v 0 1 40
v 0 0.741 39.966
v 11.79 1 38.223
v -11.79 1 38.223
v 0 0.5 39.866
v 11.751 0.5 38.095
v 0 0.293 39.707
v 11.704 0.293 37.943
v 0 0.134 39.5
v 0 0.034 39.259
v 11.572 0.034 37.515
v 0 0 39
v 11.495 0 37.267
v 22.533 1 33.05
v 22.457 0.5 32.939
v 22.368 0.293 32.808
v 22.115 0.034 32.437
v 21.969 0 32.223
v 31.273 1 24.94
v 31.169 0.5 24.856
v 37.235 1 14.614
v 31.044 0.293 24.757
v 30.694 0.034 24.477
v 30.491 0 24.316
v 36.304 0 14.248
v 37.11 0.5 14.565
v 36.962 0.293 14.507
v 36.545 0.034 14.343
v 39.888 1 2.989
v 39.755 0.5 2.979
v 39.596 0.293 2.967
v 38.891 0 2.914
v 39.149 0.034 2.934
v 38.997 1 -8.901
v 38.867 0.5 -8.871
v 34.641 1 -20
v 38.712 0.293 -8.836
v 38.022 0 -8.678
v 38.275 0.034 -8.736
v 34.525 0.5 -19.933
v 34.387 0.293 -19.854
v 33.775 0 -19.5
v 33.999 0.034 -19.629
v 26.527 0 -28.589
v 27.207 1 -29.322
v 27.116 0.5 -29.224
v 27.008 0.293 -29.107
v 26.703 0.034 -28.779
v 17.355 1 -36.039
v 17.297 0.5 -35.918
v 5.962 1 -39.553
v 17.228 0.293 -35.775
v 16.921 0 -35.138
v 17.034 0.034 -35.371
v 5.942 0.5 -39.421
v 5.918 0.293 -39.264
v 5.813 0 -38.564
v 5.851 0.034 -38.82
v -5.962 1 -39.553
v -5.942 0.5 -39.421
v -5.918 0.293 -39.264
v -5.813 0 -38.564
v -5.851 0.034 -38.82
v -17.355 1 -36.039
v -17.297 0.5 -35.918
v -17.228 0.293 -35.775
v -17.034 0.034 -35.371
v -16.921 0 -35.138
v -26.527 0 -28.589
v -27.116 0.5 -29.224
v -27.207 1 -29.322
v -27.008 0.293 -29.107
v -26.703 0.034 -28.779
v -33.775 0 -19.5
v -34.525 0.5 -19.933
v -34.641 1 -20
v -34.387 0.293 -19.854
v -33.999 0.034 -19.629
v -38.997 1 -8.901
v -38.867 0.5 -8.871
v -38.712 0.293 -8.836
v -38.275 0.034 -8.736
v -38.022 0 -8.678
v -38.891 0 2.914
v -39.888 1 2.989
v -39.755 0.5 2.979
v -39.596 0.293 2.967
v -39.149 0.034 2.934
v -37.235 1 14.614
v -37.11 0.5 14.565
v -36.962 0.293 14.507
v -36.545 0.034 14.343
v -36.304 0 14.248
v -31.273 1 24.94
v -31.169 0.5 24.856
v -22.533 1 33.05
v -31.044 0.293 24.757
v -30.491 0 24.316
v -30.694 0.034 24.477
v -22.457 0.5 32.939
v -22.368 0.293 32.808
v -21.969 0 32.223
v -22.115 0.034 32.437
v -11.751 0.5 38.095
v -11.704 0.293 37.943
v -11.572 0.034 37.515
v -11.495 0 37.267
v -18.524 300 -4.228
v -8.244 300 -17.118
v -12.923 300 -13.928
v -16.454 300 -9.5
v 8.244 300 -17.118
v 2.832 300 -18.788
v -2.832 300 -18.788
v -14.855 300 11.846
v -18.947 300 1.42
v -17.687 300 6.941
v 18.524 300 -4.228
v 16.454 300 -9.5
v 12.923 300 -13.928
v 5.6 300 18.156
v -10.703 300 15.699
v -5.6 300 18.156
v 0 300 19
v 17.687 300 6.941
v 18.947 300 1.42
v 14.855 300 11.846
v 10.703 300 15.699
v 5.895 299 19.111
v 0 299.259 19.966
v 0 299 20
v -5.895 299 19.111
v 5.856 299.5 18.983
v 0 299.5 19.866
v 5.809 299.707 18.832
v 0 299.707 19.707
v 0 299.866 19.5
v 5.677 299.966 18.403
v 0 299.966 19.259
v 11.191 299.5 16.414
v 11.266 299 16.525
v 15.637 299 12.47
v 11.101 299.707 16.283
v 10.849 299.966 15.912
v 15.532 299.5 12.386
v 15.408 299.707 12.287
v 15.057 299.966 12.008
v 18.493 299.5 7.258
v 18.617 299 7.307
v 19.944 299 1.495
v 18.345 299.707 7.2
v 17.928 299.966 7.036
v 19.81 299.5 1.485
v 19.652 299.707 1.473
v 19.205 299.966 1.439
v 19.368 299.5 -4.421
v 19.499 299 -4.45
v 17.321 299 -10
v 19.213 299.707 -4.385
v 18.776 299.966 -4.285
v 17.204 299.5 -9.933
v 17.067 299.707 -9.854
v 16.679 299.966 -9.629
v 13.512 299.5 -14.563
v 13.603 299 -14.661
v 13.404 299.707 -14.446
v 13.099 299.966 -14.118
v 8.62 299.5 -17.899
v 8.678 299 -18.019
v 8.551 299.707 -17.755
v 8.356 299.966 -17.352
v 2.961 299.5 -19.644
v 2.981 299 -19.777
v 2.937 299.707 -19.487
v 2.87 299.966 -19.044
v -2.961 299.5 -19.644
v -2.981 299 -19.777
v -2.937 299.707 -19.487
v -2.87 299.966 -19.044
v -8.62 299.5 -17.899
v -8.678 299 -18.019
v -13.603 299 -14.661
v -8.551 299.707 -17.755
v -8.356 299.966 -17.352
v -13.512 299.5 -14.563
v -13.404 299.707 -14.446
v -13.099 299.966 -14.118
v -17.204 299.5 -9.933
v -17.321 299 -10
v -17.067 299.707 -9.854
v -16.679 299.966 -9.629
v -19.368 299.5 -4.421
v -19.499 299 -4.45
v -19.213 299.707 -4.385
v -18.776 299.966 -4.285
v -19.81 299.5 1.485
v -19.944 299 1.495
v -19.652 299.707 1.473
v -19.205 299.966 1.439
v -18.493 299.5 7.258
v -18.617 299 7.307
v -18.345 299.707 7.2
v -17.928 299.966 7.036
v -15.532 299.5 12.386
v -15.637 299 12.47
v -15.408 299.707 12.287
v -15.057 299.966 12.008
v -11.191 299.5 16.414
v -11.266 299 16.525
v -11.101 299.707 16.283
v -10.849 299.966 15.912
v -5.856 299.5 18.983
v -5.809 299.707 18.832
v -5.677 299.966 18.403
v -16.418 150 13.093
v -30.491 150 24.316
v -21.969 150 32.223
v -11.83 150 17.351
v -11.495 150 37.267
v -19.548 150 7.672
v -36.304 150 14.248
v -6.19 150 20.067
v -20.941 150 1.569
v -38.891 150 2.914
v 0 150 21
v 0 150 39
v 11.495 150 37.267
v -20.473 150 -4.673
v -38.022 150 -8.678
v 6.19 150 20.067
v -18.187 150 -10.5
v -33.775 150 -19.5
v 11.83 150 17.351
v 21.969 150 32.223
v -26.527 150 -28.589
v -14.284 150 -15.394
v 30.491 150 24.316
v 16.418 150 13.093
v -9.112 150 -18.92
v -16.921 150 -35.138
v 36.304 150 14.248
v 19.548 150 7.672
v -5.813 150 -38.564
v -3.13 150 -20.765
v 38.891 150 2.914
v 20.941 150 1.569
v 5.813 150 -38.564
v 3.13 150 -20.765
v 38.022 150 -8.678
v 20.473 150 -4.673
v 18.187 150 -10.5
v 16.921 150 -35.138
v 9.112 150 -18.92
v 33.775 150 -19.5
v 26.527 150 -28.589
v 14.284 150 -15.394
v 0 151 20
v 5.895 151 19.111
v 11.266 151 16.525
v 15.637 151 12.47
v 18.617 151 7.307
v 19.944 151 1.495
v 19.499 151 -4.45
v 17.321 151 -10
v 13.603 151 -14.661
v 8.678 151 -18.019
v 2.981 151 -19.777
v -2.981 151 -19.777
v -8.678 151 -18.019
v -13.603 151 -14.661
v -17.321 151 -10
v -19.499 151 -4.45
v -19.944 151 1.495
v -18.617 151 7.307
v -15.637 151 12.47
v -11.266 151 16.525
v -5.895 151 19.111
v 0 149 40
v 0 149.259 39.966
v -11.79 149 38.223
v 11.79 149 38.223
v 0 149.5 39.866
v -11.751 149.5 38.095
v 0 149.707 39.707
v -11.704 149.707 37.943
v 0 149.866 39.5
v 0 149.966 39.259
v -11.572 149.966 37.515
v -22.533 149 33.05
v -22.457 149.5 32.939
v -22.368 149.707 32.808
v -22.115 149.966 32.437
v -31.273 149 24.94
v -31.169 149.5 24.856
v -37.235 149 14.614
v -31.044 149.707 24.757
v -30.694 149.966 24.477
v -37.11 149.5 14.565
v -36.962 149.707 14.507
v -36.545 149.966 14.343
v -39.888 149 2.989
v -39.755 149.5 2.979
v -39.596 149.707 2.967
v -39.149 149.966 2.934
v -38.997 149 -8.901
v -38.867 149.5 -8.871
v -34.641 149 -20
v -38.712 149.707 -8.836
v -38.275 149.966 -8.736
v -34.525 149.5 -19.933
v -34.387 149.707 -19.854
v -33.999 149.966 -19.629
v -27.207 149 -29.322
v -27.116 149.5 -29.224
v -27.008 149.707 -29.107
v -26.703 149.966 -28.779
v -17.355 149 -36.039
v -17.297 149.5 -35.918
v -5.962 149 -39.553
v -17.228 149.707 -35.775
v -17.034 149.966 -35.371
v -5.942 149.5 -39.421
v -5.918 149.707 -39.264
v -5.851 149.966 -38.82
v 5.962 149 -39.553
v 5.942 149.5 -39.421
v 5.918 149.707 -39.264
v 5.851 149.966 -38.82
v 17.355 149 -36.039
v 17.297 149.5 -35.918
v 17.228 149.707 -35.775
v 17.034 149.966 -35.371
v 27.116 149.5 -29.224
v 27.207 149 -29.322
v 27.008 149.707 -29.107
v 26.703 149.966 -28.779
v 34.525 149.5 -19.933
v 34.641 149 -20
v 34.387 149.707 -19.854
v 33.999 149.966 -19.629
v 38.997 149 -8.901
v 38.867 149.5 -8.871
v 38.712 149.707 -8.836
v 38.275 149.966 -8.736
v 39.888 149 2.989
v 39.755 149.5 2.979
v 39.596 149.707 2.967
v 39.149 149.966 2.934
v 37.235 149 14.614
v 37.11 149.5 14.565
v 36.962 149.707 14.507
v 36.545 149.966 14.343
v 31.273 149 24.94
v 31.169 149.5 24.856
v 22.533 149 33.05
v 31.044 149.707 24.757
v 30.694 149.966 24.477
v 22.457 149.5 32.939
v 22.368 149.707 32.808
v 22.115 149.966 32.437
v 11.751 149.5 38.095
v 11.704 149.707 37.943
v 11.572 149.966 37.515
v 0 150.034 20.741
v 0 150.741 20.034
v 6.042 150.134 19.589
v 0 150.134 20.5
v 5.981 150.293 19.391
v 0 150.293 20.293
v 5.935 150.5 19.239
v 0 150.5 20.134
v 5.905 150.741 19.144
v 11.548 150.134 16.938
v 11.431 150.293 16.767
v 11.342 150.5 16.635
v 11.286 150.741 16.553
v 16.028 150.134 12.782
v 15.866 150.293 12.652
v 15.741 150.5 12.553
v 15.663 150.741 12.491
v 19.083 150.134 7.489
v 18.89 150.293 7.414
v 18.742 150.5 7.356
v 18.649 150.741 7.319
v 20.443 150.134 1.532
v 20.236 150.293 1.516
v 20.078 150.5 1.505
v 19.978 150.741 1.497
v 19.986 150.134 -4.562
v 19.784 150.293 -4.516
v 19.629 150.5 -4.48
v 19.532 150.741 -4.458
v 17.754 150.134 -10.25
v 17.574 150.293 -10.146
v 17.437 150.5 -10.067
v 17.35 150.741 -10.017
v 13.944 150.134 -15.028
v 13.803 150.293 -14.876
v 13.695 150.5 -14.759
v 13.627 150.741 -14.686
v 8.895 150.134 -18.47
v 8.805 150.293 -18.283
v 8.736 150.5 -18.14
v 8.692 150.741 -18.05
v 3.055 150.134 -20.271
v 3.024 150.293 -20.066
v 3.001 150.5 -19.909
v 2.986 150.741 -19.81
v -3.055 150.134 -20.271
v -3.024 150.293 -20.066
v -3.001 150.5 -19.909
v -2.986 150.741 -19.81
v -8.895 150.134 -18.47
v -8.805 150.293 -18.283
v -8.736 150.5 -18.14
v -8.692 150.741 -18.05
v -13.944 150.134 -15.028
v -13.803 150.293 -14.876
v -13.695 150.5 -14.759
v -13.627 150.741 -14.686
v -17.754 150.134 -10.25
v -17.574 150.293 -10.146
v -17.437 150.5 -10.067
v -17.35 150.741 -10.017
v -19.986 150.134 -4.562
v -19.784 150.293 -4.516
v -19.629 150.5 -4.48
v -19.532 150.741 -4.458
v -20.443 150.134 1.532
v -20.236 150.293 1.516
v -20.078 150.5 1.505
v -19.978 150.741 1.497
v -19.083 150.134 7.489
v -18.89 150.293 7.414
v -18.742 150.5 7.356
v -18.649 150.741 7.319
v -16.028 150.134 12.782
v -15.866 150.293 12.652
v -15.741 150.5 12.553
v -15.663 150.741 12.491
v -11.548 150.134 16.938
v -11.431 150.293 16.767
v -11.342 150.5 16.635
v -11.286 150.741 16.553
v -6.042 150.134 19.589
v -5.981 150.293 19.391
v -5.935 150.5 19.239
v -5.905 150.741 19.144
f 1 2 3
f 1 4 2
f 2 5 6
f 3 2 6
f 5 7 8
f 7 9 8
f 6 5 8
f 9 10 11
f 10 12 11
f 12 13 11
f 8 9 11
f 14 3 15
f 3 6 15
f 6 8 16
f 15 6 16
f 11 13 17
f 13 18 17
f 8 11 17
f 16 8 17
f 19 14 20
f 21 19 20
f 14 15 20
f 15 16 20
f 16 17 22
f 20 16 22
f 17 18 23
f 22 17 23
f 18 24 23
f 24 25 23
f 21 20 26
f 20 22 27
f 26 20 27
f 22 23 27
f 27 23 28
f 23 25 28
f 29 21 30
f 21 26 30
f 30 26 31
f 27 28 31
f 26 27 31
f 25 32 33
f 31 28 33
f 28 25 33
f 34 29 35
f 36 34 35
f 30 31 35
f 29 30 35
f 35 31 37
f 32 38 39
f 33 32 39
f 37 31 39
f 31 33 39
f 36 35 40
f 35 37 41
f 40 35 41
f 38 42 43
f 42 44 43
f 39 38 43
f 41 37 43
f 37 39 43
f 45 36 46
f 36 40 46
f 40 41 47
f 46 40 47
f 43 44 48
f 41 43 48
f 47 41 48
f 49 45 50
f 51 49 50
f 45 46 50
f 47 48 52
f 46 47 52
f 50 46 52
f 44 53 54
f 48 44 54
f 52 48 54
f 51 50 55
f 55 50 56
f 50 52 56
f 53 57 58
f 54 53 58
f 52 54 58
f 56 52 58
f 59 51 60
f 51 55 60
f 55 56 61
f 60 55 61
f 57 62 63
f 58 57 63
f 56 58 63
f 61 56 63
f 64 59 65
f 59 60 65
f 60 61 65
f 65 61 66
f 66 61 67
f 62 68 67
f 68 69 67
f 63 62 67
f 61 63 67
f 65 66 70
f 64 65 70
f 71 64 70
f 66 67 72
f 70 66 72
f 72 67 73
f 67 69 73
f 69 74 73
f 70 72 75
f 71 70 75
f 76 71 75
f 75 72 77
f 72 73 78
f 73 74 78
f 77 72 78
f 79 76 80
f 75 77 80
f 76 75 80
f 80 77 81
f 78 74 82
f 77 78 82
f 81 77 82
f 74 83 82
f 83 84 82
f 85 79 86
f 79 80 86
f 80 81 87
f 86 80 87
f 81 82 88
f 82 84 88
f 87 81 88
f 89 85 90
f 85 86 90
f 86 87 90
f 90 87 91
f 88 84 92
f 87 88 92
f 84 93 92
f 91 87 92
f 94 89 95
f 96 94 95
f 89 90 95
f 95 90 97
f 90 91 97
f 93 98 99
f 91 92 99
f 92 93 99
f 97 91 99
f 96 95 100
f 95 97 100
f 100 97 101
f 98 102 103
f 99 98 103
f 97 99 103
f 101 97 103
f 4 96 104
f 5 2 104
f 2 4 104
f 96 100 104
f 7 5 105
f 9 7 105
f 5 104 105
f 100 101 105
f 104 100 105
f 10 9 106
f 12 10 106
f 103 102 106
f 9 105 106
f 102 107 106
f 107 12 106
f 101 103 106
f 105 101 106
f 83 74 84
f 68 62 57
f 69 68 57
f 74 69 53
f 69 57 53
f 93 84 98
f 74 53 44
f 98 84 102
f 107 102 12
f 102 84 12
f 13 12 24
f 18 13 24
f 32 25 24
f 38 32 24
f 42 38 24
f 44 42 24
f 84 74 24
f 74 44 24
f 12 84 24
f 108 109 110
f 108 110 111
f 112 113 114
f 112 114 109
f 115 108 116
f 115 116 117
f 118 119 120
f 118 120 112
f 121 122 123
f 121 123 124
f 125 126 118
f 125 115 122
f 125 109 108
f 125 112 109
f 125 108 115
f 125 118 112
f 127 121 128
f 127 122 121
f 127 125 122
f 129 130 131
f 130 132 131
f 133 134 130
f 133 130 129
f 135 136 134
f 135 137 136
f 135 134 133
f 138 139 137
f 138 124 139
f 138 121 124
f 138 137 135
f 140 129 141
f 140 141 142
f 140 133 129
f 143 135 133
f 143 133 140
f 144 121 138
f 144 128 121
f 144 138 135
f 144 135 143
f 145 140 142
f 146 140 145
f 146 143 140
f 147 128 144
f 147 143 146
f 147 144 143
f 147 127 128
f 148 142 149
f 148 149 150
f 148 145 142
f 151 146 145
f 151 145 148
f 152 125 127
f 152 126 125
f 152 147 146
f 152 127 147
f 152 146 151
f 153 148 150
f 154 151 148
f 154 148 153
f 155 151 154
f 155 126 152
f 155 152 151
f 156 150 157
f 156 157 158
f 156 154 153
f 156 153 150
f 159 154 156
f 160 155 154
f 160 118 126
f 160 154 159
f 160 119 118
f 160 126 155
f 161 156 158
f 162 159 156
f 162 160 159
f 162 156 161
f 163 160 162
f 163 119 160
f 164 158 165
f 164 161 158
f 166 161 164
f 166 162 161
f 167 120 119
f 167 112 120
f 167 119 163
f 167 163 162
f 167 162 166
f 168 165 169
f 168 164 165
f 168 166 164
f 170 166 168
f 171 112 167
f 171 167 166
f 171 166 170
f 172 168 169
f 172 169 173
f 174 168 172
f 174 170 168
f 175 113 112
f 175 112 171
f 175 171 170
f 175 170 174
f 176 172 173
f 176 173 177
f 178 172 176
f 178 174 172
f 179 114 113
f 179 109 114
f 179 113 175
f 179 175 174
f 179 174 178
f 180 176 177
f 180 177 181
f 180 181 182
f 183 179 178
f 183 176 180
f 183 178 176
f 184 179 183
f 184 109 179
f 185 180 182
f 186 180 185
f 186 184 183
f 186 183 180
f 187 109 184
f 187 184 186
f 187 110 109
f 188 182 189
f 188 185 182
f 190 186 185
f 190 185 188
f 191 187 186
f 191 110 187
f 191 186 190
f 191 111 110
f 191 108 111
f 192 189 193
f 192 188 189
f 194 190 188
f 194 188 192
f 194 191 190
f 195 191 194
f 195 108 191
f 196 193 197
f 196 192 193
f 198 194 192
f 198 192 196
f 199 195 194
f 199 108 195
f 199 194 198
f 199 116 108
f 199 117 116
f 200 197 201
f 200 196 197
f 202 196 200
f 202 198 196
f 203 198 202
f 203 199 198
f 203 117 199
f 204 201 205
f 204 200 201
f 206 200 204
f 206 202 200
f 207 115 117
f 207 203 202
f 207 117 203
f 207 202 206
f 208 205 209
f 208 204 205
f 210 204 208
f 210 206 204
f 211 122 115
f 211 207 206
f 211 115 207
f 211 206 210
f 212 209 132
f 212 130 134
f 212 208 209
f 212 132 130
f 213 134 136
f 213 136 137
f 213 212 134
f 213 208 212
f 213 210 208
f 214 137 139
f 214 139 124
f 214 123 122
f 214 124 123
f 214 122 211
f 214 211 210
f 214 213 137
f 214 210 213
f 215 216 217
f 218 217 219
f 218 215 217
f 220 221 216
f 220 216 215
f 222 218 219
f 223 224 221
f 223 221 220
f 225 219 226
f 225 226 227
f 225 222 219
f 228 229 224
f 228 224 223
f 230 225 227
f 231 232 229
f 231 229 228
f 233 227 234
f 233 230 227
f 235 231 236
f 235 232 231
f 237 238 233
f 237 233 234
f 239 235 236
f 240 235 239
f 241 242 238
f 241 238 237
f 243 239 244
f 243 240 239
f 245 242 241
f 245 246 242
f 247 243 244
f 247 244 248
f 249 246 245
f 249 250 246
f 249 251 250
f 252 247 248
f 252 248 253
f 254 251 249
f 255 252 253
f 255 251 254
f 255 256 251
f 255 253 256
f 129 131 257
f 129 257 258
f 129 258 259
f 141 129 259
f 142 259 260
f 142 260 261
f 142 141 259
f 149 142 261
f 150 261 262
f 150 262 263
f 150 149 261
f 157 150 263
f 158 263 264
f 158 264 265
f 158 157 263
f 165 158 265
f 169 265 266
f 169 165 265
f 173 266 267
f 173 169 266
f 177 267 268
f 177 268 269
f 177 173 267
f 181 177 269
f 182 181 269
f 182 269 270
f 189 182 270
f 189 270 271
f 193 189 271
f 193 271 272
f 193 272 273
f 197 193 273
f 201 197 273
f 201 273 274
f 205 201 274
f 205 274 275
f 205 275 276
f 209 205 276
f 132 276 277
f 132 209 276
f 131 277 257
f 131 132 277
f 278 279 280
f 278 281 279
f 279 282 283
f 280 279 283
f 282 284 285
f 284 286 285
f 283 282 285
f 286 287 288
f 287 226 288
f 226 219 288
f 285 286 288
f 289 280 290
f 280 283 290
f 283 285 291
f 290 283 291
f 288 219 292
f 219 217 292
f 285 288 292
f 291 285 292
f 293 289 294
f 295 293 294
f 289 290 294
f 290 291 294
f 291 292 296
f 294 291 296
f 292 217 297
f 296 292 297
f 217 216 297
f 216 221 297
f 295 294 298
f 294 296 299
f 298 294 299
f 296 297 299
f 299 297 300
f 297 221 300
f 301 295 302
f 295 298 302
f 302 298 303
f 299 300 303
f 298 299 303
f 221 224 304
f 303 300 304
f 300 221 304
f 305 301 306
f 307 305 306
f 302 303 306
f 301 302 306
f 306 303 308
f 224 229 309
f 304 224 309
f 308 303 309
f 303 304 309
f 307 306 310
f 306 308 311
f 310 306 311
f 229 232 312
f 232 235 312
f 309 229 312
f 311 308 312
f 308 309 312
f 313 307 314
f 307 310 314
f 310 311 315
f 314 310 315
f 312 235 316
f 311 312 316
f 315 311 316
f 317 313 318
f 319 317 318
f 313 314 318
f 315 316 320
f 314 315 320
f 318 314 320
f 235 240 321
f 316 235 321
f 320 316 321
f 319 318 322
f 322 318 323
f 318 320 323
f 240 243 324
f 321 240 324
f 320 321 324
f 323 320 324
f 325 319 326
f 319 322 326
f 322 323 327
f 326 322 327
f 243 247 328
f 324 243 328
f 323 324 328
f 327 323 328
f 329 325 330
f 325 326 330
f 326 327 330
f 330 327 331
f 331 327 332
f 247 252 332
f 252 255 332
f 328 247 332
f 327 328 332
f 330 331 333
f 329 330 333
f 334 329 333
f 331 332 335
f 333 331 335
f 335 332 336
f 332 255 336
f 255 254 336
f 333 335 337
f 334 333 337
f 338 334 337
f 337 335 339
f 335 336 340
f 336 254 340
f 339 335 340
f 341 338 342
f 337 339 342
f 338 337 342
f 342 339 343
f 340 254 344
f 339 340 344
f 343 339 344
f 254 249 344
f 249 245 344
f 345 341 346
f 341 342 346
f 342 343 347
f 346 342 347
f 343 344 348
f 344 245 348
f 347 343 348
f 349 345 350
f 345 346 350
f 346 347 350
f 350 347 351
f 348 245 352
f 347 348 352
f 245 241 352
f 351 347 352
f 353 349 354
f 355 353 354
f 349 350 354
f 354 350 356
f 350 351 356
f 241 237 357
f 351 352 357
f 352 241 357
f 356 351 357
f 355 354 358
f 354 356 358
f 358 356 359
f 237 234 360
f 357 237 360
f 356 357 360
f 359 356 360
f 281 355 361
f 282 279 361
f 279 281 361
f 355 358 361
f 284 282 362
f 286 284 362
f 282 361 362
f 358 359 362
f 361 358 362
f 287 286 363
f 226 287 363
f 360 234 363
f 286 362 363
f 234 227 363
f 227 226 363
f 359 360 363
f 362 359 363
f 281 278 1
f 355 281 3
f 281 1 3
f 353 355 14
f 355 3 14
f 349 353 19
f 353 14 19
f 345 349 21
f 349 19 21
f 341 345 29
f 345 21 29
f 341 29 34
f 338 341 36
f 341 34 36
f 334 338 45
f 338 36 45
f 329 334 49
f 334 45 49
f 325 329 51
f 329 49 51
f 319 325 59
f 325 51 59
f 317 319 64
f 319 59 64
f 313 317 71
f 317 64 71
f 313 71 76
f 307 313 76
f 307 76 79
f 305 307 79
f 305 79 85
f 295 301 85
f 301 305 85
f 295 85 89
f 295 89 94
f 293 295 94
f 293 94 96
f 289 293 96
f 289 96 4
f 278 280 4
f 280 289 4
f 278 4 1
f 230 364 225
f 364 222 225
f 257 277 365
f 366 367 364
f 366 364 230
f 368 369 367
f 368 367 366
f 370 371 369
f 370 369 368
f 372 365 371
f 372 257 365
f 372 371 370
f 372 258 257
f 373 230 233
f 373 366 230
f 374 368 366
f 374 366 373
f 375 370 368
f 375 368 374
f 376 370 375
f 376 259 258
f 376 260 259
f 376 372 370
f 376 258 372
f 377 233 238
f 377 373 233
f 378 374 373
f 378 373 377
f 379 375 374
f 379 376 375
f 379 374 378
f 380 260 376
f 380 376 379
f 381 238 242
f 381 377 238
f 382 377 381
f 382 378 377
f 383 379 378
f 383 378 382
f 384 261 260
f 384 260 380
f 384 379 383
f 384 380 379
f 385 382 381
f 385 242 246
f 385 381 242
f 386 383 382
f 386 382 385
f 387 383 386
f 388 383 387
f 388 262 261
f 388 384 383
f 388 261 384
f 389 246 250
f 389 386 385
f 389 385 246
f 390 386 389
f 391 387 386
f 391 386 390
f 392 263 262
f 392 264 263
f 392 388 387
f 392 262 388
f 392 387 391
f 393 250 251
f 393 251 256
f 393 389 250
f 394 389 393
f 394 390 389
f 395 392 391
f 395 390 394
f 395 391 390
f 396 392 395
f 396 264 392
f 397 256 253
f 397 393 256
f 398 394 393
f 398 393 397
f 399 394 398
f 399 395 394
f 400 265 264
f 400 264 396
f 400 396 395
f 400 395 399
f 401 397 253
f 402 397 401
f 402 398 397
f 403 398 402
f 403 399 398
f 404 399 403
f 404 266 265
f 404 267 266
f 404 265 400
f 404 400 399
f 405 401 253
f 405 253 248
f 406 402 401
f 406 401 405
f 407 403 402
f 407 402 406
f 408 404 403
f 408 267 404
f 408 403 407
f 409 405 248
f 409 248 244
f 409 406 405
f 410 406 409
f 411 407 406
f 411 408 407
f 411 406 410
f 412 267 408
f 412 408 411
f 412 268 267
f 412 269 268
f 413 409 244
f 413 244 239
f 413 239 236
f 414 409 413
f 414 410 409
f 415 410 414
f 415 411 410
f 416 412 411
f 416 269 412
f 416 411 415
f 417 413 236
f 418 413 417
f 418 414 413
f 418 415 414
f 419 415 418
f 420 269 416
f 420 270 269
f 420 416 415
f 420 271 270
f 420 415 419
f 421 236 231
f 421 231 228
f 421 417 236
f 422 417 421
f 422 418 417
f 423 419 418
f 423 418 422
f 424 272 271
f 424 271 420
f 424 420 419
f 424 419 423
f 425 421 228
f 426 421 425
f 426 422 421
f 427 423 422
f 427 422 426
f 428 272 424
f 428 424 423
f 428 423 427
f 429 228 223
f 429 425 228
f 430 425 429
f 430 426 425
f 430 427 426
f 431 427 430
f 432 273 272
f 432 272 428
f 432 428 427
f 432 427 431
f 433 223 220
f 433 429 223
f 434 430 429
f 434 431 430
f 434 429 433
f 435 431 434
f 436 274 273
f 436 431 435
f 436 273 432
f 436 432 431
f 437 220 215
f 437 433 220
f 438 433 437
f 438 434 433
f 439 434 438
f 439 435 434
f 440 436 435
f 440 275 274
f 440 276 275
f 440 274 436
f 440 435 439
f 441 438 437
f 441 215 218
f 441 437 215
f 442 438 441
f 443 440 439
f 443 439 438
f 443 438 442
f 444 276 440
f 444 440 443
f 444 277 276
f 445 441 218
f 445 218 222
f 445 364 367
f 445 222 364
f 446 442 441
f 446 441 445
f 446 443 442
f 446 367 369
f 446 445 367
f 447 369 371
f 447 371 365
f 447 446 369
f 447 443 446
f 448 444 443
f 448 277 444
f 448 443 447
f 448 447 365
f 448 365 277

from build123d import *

# Parameters (mm, degrees)
SKETCH_1_R          = 40
EXTRUDE_1_DEPTH     = 300
SKETCH_2_OUTSIDE_W  = 146.124
SKETCH_2_OUTSIDE_H  = 146.124
SKETCH_2_OUTSIDE_R  = 20
CUT_EXTRUDE_1_DEPTH = 150
FILLET_2_R          = 1
FILLET_3_R          = 1
FILLET_4_R          = 1
FILLET_5_R          = 1


with BuildPart() as part:
    # Эскиз1 → Бобышка-Вытянуть1 (new body)
    with BuildSketch(Plane(origin=(0, 0, 0), x_dir=(1, 0, 0), z_dir=(0, 1, 0))):
        with Locations(Location((0, 0, 0), (0, 0, 270))):
            Circle(SKETCH_1_R)
    extrude(amount=EXTRUDE_1_DEPTH)

    # Эскиз2 outside → Вырез-Вытянуть1 (cut)
    with BuildSketch(Plane(origin=(0, 300, 0), x_dir=(1, 0, 0), z_dir=(0, 1, 0))):
        Rectangle(SKETCH_2_OUTSIDE_W, SKETCH_2_OUTSIDE_H)
        with Locations(Location((0, 0, 0), (0, 0, 270))):
            Circle(SKETCH_2_OUTSIDE_R, mode=Mode.SUBTRACT)
    extrude(amount=-CUT_EXTRUDE_1_DEPTH, mode=Mode.SUBTRACT)

    # Скругление2
    fillet_2_edges = [part.edges().sort_by_distance(p)[0] for p in [
        (0, 150, -20),
    ]]
    fillet(fillet_2_edges, radius=FILLET_2_R)

    # Скругление3
    fillet_3_edges = [part.edges().sort_by_distance(p)[0] for p in [
        (0, 300, -20),
    ]]
    fillet(fillet_3_edges, radius=FILLET_3_R)

    # Скругление4
    fillet_4_edges = [part.edges().sort_by_distance(p)[0] for p in [
        (0, 0, -40),
    ]]
    fillet(fillet_4_edges, radius=FILLET_4_R)

    # Скругление5
    fillet_5_edges = [part.edges().sort_by_distance(p)[0] for p in [
        (0, 150, -40),
    ]]
    fillet(fillet_5_edges, radius=FILLET_5_R)


solid = part.part
